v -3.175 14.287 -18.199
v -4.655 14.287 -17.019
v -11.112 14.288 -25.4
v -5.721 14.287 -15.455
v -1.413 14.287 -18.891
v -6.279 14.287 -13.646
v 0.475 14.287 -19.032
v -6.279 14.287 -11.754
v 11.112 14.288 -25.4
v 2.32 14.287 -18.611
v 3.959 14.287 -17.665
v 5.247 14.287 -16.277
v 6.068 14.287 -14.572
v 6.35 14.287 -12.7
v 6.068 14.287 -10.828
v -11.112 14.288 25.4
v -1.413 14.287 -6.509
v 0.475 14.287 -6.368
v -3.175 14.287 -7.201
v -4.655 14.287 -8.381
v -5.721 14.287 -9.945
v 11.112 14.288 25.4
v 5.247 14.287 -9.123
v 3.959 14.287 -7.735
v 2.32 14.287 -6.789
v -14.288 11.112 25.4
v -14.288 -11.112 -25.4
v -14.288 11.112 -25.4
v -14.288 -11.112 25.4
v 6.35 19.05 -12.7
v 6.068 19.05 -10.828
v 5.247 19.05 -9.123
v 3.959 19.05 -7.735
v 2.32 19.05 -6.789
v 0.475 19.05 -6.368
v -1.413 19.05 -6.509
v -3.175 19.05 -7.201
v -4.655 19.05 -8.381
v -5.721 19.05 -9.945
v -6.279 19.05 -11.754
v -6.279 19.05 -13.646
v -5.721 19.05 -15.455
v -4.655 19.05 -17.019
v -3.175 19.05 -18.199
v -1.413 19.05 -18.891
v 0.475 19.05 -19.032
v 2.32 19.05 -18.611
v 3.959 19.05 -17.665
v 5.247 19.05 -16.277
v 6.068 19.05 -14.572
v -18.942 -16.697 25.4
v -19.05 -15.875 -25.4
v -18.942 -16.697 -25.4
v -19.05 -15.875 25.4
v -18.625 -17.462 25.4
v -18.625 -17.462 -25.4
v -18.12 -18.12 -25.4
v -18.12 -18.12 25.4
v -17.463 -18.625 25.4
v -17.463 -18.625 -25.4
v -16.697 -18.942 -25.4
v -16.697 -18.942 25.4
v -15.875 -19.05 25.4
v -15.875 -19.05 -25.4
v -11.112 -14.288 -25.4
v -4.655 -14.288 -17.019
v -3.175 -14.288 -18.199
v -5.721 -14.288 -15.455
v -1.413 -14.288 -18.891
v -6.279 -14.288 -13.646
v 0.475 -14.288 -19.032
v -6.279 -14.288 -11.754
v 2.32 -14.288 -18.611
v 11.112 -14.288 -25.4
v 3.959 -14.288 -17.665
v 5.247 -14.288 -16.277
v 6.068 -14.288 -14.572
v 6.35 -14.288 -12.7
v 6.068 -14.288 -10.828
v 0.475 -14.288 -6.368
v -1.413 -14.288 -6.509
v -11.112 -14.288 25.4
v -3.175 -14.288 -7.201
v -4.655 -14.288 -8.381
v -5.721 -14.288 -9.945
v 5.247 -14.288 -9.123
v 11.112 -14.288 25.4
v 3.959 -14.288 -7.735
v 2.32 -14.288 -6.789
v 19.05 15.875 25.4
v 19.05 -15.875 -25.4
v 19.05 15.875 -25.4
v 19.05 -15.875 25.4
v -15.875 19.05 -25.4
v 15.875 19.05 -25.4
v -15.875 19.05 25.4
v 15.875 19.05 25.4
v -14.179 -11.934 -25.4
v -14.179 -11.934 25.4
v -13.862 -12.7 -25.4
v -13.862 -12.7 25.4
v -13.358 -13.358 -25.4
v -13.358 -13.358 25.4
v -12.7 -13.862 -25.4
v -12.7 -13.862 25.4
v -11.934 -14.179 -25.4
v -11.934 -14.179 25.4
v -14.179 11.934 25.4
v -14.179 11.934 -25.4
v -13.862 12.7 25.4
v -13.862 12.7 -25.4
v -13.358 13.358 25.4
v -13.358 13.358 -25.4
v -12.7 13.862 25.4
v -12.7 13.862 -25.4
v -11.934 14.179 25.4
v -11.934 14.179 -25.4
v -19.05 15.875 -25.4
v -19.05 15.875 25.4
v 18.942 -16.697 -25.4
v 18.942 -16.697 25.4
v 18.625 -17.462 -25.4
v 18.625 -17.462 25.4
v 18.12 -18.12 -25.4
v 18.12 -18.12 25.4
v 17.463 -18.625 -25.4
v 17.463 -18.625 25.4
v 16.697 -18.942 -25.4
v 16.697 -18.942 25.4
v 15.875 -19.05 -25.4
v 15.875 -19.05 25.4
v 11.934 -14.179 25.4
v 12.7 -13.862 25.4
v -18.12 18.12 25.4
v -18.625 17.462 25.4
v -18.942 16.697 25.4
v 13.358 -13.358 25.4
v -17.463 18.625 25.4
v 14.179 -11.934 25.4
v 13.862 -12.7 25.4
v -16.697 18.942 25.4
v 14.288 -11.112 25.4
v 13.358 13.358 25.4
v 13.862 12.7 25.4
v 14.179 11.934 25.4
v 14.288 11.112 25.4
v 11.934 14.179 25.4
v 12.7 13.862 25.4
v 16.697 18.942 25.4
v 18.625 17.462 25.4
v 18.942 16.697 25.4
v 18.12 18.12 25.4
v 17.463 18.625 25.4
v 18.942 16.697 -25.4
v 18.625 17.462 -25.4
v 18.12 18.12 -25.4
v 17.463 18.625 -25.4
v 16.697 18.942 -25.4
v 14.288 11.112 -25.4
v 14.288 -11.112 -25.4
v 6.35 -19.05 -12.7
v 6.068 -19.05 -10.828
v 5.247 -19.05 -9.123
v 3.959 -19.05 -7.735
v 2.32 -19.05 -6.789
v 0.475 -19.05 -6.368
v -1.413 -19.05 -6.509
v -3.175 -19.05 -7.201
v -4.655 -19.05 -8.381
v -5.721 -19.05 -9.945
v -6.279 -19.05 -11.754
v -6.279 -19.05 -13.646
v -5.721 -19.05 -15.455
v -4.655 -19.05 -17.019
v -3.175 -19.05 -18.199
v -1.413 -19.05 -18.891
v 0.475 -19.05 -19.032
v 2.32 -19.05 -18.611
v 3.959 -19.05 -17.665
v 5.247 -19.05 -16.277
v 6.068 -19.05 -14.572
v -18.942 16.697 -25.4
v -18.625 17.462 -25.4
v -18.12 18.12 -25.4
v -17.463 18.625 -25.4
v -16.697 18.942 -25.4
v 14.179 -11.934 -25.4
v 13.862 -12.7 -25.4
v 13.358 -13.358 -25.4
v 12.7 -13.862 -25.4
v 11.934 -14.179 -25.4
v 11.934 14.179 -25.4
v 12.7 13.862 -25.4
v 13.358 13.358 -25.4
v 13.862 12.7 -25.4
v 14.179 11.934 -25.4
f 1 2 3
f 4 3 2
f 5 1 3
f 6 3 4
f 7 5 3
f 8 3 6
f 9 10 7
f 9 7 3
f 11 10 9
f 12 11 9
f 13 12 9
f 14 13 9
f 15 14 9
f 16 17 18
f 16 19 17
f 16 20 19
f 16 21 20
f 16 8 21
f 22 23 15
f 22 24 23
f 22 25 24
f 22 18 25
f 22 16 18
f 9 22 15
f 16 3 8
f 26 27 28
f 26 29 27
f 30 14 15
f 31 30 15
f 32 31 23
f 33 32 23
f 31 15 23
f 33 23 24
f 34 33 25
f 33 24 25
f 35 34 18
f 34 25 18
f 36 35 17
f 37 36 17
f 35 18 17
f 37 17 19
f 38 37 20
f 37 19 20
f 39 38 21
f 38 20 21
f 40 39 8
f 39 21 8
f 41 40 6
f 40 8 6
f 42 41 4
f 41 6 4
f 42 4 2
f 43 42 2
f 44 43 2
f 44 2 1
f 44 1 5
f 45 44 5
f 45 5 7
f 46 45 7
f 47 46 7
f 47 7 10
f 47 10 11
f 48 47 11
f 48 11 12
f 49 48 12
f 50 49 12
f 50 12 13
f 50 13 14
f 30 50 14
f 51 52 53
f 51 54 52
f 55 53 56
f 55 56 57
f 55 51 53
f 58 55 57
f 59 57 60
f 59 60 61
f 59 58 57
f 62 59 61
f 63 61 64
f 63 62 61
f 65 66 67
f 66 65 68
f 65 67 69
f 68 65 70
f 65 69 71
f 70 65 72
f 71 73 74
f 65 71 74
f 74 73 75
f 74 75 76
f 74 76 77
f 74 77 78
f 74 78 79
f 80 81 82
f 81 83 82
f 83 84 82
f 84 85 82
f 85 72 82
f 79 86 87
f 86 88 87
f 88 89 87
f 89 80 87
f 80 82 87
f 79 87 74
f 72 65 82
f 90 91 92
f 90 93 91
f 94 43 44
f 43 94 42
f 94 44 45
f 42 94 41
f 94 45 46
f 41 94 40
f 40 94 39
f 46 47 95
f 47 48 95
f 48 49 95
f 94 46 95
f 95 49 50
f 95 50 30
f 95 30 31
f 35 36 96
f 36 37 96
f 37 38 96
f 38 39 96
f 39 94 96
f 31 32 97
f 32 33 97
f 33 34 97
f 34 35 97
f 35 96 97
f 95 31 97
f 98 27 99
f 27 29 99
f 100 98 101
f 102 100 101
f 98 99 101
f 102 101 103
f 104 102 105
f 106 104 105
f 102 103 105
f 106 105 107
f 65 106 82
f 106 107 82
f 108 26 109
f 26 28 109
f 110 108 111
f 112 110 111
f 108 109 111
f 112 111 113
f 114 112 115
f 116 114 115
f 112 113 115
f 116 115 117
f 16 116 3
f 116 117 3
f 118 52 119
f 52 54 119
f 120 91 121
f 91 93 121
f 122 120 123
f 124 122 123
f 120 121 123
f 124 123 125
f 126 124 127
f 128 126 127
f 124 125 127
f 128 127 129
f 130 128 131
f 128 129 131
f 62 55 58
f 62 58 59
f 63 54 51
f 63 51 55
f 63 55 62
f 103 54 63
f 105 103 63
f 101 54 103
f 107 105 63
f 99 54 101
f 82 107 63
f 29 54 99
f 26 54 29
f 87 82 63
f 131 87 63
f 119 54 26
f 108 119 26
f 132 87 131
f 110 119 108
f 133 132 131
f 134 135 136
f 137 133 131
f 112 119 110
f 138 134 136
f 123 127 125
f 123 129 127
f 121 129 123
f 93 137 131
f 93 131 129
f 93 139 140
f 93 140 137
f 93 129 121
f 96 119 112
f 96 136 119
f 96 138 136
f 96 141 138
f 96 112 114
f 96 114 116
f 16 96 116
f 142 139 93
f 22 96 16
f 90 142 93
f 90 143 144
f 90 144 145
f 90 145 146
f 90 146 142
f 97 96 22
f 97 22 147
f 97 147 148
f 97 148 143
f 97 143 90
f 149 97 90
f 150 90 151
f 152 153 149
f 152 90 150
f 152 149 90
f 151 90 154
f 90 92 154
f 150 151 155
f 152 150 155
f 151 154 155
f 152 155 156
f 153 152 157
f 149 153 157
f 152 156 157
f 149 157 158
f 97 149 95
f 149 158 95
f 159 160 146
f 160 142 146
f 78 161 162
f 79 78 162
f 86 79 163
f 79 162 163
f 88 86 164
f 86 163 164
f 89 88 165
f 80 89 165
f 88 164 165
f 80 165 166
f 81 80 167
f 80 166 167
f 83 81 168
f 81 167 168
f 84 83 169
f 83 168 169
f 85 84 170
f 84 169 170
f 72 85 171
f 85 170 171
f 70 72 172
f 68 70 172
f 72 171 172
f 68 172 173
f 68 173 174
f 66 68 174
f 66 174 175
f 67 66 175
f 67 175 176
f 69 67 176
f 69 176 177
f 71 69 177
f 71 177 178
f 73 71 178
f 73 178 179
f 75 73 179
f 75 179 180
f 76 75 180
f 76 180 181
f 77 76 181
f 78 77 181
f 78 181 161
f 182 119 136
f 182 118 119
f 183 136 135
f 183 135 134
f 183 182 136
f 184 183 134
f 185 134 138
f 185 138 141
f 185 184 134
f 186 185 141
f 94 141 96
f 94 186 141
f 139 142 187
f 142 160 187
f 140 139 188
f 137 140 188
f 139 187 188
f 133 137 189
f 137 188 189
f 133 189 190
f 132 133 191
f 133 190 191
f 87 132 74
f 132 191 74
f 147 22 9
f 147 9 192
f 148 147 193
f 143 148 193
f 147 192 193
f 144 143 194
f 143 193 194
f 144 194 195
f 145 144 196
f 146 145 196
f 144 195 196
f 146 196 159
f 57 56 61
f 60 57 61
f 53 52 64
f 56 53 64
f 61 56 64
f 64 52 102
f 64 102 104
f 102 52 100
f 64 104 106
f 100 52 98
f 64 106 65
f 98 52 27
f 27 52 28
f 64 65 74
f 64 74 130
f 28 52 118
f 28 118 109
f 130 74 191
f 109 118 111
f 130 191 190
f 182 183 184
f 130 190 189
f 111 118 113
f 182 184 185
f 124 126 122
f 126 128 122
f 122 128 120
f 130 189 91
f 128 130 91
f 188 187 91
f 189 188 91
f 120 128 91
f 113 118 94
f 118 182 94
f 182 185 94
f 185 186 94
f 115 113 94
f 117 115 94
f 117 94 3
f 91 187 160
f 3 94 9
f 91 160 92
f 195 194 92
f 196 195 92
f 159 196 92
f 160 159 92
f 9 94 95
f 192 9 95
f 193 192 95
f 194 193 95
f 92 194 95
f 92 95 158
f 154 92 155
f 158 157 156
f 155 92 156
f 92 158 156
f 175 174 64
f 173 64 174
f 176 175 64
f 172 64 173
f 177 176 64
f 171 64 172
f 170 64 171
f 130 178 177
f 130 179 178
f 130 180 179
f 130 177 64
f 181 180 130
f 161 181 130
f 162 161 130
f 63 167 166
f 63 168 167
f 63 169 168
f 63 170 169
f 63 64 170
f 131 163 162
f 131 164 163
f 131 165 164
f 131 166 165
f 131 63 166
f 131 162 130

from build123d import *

# Parameters (mm, degrees)
F0_W     = 38.1
F0_H     = 38.1
F0_W_2   = 28.575
F0_H_2   = 28.575
F1_DEPTH = 25.4
F2_R     = 3.175
F3_R     = 6.35
F4_DEPTH = 38.1


with BuildPart() as f1:
    # F0 (on Top) → F1 (new body, symmetric)
    with BuildSketch(Plane.XY):
        Rectangle(F0_W, F0_H)
        Rectangle(F0_W_2, F0_H_2, mode=Mode.SUBTRACT)
    extrude(amount=F1_DEPTH, both=True)

    # F2
    f2_edges = [f1.edges().sort_by_distance(p)[0] for p in [
        (19.05, -19.05, 0),
        (-19.05, -19.05, 0),
        (-14.2875, 14.2875, 0),
        (14.2875, 14.2875, 0),
        (-19.05, 19.05, 0),
        (19.05, 19.05, 0),
        (-14.2875, -14.2875, 0),
        (14.2875, -14.2875, 0),
    ]]
    fillet(f2_edges, radius=F2_R)

    # F3 (on face) → F4 (cut, through all)
    with BuildSketch(Plane.XZ.offset(19.05)):
        with Locations((0, -12.7)):
            Circle(F3_R)
    extrude(amount=-F4_DEPTH, mode=Mode.SUBTRACT)


solid = f1.part
